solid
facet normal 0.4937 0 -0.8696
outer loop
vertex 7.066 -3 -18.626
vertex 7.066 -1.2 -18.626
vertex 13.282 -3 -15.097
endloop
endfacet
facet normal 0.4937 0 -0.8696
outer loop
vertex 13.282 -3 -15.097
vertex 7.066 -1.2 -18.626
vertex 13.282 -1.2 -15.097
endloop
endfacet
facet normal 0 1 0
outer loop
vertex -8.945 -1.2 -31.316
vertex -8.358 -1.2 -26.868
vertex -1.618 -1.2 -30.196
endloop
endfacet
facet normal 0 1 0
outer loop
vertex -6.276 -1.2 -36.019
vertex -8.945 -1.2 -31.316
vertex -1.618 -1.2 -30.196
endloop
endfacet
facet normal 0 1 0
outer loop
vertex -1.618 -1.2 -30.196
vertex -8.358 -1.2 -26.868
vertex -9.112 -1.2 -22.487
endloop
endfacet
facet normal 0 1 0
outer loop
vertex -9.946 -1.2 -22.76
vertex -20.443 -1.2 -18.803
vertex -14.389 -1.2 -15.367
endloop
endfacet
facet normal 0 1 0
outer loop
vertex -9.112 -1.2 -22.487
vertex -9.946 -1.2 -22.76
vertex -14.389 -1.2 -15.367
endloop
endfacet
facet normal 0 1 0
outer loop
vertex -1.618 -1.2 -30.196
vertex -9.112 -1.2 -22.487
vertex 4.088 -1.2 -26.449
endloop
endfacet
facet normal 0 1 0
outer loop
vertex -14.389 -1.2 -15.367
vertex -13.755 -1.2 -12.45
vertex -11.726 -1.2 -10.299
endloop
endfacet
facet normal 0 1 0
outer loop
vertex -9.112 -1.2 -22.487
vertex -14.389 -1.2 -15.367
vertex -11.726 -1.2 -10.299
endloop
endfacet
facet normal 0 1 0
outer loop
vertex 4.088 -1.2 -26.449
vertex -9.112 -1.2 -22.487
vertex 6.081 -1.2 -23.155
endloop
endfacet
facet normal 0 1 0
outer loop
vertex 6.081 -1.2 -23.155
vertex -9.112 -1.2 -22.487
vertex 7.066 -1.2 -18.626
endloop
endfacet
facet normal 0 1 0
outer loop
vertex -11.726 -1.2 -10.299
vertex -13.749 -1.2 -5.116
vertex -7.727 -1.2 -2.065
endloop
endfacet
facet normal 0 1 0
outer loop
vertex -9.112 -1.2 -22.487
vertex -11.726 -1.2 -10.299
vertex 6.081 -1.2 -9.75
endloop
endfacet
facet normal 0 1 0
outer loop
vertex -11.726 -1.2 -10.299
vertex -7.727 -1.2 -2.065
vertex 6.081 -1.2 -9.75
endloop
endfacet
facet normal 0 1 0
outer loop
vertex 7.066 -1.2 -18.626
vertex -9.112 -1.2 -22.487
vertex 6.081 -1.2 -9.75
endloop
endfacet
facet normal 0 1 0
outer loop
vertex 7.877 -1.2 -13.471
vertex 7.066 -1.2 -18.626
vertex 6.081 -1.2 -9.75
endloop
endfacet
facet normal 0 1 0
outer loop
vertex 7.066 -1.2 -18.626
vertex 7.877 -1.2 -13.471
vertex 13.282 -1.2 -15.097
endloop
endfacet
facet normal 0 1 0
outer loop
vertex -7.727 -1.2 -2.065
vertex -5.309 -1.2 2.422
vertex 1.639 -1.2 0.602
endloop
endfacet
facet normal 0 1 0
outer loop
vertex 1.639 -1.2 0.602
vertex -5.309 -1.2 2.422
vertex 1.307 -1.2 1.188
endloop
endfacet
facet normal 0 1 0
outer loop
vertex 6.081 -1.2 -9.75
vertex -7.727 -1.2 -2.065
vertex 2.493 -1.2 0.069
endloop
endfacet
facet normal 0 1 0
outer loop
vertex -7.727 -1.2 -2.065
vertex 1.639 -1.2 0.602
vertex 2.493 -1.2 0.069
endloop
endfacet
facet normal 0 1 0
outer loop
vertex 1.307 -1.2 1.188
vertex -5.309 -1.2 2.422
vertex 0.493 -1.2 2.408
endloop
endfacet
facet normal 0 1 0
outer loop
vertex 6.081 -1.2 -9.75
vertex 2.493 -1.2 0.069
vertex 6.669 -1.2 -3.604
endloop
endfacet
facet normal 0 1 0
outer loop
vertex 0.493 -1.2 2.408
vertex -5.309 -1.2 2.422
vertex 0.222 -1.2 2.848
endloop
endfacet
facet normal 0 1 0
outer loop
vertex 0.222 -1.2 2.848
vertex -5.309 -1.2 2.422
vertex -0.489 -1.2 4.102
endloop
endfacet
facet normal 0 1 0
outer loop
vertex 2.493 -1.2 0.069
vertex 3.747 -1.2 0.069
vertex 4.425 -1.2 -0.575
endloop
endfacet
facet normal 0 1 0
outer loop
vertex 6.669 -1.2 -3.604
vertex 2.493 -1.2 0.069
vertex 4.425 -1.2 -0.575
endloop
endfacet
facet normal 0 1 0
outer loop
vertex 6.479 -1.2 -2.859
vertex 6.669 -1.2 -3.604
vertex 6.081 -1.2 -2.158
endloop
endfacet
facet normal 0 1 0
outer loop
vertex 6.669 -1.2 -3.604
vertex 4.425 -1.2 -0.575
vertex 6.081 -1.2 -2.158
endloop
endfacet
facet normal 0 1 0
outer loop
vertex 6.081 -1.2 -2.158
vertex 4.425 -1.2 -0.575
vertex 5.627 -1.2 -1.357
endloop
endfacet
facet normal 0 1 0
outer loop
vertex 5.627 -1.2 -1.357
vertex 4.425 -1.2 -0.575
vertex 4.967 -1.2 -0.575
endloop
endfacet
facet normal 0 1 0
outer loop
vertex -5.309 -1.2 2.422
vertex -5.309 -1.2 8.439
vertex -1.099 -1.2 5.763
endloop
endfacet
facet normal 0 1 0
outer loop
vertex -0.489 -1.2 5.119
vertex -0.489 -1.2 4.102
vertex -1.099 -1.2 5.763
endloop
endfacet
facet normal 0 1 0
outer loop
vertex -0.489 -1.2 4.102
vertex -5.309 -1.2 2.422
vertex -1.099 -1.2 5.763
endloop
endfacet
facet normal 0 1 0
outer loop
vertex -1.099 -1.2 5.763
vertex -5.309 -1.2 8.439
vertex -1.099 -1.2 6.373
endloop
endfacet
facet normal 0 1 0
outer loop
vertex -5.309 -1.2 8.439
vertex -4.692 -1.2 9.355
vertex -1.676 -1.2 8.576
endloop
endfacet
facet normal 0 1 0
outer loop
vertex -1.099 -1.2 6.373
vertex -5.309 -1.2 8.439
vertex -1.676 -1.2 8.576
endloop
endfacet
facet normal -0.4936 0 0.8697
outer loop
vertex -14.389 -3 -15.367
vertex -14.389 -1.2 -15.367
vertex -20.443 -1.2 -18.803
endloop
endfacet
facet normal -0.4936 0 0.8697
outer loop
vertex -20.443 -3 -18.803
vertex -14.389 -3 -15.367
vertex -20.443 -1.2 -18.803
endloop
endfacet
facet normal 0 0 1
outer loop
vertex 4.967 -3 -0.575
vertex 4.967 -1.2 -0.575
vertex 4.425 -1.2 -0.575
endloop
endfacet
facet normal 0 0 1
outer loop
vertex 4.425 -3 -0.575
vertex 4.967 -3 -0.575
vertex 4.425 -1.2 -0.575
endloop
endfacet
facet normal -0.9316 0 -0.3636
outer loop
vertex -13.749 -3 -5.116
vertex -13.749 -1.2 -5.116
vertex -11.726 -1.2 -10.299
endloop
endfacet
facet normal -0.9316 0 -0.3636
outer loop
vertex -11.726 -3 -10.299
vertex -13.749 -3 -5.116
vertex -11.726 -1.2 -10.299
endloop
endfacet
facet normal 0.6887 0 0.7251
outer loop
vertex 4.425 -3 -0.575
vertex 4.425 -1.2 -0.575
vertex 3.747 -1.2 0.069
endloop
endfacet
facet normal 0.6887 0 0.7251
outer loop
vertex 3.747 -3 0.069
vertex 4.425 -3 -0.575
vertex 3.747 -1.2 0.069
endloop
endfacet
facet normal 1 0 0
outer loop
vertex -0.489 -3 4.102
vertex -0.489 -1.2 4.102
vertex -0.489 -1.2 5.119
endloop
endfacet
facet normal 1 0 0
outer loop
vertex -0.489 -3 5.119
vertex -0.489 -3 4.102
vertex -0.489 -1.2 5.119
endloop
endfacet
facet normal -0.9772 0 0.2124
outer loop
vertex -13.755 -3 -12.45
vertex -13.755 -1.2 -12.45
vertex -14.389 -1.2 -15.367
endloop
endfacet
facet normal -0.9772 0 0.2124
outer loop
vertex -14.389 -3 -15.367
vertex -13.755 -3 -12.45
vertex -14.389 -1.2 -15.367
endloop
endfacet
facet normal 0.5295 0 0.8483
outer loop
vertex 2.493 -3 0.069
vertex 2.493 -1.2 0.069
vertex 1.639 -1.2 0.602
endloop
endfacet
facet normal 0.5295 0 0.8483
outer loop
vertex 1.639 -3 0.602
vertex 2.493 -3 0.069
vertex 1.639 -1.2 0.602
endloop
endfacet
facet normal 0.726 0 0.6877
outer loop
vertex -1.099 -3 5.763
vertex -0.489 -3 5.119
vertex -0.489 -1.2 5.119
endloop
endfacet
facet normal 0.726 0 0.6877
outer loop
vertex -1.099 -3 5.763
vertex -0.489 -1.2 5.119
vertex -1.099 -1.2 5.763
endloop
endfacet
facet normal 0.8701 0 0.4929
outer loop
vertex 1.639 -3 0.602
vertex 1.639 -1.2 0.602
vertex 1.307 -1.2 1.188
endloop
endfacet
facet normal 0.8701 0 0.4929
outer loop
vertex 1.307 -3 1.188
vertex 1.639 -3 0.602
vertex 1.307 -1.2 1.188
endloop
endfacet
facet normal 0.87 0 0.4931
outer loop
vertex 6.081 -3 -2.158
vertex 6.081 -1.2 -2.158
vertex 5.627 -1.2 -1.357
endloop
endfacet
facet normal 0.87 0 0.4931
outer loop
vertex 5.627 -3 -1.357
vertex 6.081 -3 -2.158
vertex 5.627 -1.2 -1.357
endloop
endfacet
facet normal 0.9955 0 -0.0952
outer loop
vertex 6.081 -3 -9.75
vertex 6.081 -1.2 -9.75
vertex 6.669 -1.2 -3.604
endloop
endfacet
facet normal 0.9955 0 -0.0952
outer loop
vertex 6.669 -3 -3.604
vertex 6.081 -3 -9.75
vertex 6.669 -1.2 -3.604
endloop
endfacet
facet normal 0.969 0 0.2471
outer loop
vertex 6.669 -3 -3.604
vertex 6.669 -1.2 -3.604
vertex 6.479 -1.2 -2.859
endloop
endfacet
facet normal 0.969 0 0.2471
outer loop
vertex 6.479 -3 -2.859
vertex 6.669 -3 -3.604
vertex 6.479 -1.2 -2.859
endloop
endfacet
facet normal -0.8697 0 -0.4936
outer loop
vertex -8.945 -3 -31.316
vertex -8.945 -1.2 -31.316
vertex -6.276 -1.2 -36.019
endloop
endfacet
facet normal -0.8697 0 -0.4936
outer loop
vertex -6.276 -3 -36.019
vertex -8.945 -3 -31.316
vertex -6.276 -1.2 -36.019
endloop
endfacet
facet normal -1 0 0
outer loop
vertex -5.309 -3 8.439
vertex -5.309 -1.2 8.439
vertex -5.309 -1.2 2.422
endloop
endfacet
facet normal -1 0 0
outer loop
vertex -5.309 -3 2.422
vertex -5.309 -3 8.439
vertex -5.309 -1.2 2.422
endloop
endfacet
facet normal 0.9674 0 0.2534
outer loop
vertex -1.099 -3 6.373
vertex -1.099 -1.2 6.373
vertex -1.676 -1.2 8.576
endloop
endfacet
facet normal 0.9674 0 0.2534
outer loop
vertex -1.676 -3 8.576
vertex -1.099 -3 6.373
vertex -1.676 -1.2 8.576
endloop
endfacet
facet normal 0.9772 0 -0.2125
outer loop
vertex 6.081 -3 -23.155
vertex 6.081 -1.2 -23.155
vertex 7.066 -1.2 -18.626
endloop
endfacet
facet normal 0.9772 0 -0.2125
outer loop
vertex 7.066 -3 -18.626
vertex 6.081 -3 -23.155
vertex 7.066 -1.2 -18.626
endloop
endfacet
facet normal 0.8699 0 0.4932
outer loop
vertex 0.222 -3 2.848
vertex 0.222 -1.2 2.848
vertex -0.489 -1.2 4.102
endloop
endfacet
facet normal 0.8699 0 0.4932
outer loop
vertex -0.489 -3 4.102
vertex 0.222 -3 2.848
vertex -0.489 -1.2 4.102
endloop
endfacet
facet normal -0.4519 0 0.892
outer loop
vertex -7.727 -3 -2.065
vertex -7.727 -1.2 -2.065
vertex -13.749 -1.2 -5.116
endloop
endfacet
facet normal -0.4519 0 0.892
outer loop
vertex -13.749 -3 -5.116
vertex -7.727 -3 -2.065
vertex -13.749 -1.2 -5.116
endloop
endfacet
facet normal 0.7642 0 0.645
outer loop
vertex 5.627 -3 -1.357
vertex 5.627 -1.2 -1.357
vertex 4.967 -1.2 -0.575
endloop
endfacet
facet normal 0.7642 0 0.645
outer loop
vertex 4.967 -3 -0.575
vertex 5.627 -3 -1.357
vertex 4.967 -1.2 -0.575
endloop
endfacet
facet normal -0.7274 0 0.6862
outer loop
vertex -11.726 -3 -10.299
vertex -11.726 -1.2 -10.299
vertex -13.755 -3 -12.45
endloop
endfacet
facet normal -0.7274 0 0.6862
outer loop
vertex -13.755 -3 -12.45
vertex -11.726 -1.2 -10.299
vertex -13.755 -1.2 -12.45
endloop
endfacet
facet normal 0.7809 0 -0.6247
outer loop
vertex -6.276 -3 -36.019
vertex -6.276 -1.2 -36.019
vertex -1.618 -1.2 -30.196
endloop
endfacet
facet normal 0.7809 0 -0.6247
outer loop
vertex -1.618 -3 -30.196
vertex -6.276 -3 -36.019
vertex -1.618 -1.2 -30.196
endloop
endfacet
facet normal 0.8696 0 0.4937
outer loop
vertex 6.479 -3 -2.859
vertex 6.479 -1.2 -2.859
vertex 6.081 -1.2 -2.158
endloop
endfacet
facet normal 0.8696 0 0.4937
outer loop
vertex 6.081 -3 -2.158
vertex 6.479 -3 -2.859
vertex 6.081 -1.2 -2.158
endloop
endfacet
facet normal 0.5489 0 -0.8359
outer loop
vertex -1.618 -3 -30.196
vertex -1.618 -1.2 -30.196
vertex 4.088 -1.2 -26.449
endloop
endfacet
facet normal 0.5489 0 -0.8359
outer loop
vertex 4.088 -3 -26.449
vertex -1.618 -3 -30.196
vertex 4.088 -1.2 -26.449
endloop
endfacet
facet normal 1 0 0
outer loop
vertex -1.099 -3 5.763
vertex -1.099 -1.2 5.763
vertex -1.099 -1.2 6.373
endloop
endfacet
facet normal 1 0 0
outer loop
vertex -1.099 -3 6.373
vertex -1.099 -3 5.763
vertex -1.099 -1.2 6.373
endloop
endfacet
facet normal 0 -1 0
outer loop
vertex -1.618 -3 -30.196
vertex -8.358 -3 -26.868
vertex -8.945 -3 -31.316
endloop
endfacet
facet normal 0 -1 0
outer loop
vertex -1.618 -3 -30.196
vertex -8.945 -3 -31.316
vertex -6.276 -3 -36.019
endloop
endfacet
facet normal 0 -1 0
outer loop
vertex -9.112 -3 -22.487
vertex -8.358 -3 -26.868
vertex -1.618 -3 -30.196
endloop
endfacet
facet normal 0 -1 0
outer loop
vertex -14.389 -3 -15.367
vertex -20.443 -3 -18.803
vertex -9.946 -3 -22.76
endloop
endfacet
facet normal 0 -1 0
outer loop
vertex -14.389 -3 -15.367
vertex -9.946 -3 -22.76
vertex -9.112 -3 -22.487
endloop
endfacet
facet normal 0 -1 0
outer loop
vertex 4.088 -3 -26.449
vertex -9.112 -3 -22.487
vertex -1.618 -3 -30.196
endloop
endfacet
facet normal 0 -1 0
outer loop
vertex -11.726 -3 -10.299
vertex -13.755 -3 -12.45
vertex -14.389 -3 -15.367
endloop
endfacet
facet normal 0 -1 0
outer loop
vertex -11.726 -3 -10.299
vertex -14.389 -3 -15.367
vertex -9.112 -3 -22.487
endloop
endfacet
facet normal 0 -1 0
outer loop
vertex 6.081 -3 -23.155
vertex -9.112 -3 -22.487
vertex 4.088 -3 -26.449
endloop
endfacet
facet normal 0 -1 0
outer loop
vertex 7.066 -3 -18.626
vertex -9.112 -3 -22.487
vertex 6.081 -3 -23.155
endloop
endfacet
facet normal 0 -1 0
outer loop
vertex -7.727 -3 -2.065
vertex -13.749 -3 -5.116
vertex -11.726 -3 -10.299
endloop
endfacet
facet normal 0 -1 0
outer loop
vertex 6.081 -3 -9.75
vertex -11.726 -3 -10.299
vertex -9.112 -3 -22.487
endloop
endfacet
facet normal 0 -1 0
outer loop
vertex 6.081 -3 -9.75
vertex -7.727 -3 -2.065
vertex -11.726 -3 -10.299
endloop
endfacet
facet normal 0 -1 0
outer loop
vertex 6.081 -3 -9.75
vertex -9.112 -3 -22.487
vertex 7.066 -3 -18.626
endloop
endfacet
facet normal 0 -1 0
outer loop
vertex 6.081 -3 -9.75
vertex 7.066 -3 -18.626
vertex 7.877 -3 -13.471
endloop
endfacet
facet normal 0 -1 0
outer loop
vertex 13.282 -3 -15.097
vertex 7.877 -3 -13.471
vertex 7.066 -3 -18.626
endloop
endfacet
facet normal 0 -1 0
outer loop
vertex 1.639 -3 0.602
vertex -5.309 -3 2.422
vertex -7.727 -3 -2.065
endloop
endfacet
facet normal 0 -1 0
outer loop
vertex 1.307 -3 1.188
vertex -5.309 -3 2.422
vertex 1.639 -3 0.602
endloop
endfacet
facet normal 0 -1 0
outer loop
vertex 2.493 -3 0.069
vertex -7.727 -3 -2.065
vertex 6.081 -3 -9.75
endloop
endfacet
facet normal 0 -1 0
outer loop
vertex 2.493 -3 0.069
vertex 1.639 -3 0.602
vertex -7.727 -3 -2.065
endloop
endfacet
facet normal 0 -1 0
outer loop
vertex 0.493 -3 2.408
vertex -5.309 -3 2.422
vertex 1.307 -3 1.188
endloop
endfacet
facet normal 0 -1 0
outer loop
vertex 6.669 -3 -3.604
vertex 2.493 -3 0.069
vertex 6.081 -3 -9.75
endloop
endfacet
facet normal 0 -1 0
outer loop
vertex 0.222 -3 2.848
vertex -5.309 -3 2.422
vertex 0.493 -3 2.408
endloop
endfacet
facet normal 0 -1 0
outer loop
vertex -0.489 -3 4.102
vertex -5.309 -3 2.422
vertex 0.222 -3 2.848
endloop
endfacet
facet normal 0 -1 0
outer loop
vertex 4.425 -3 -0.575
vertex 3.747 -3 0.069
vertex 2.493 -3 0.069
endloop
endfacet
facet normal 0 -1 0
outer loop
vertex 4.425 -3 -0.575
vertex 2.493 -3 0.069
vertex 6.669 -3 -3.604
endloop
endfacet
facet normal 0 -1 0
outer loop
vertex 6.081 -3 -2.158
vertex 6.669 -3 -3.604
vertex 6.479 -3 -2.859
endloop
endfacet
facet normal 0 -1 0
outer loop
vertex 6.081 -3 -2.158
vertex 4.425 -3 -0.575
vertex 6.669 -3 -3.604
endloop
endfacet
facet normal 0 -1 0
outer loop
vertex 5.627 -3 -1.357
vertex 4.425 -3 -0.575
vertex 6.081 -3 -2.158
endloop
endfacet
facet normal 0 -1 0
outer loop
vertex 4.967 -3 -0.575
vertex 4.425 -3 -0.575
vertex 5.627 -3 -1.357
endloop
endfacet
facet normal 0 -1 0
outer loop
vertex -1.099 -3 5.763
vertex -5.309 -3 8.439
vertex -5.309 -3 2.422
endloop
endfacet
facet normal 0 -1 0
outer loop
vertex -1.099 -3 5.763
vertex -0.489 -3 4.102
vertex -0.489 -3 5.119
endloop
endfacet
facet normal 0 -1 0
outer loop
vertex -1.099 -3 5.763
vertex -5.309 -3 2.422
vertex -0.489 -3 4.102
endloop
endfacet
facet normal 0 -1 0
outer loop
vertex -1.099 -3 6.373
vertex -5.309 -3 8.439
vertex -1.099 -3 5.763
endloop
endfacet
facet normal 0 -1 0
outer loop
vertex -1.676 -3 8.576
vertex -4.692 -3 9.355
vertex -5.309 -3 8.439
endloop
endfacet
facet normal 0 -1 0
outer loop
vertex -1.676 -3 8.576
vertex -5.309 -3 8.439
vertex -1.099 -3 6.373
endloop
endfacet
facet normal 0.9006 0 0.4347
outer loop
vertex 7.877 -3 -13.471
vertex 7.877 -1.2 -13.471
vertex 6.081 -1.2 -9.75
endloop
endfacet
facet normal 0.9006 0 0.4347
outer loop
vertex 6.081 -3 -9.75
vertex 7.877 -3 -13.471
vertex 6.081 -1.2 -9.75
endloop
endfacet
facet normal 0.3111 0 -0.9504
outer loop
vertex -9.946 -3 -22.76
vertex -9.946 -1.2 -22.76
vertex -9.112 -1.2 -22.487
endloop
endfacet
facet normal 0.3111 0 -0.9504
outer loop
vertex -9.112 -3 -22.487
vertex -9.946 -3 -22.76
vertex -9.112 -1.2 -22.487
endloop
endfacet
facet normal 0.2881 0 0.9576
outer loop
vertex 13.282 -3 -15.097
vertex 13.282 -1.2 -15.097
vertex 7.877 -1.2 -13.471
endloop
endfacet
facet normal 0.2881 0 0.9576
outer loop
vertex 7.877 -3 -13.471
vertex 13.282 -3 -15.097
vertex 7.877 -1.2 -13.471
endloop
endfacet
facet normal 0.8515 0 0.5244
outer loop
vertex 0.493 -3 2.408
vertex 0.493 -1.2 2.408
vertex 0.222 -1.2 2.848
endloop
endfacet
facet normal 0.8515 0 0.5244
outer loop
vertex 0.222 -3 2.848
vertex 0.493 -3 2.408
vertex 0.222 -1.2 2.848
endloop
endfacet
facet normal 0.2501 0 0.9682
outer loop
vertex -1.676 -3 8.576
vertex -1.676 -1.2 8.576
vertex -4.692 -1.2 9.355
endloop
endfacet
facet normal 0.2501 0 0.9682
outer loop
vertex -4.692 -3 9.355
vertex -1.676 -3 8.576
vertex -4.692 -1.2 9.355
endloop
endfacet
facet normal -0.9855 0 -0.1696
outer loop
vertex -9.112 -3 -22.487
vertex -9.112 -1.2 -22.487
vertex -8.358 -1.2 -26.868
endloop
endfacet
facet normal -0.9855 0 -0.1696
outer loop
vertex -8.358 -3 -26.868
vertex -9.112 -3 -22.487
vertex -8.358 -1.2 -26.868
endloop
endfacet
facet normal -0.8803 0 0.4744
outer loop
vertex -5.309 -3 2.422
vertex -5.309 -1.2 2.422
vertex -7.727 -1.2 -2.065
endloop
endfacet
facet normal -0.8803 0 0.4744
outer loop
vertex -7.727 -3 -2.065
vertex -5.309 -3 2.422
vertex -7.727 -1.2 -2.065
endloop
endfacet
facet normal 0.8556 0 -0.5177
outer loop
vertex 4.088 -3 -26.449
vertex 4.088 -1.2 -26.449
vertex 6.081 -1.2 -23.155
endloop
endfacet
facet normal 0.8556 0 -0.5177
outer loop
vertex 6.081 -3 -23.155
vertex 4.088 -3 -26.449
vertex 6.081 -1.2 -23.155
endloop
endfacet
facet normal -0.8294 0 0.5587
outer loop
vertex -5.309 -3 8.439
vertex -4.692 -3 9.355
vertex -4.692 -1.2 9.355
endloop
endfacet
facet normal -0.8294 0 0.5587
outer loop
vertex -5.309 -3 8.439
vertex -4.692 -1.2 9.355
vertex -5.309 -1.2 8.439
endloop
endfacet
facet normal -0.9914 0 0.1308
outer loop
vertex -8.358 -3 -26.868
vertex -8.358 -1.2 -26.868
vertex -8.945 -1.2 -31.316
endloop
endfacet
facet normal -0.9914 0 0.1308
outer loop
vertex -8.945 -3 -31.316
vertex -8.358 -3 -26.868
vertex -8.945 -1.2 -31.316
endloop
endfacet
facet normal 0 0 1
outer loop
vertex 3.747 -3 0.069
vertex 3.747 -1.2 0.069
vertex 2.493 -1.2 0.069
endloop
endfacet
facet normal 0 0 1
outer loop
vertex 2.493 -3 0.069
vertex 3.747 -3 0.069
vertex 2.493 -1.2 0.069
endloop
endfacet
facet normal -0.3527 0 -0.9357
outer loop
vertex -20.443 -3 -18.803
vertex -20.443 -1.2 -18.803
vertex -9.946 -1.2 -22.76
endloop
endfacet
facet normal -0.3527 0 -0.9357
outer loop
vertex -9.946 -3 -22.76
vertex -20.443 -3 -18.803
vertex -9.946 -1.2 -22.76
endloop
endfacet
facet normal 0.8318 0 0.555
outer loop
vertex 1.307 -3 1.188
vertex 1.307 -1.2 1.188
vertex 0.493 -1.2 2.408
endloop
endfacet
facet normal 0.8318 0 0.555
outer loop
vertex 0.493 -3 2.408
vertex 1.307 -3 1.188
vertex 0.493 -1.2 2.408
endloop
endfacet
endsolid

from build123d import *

# Parameters (mm, degrees)
F1_DEPTH = 3
F2_SCALE = 0.6


with BuildPart() as f1:
    # F0 (on Front) → F1 (new body)
    with BuildSketch(Plane.XZ):
        Polygon((1.3910490088, 38.3051857352), (-3.6360053346, 39.6043136716), (-4.6649789438, 38.0779765546), (-4.6649789438, 28.0484538525), (-8.694652468, 20.5713305622), (-18.7318380922, 15.4852615669), (-15.3588512912, 6.848028861), (-18.7413649335, 3.2623104389), (-19.7978429212, -1.5990479397), (-29.8871286213, -7.3253973387), (-12.3931569979, -13.9208259061), (-11.0025182366, -13.4662510827), (-9.7458269447, -20.7670312375), (-10.7237989575, -28.1813337487), (-6.2755574472, -36.0187143087), (1.4870599844, -26.3149570674), (10.9971901402, -20.069969818), (14.3194012509, -14.5789282396), (15.9598111512, -7.0306210286), (26.3209752738, -1.149962307), (17.3118170351, 1.5612578718), (14.3194012509, 7.7631301247), (15.2990790084, 18.0060230196), (14.9825164439, 19.2469840983), (14.3194012509, 20.4153303112), (13.5617544875, 21.7502322048), (12.4618653208, 23.0545718223), (11.5581247956, 23.0545718223), (10.428449139, 24.1277627647), (8.3385501057, 24.1277627647), (6.9153775882, 25.0160566247), (6.3616191037, 25.9917266667), (5.0060097128, 28.0251428485), (4.5541389845, 28.7594310939), (3.3679804765, 30.8493301272), (3.3679804765, 32.5438417494), (2.3512728512, 33.6170345545), (2.3512728512, 34.6337407827), align=None)
    extrude(amount=F1_DEPTH)


with BuildPart() as f1_1:
    # F2: moved
    add(f1.part.scale(F2_SCALE).moved(Location((-2.5102229789, -1.2, -14.4074857235))))


solid = f1_1.part
